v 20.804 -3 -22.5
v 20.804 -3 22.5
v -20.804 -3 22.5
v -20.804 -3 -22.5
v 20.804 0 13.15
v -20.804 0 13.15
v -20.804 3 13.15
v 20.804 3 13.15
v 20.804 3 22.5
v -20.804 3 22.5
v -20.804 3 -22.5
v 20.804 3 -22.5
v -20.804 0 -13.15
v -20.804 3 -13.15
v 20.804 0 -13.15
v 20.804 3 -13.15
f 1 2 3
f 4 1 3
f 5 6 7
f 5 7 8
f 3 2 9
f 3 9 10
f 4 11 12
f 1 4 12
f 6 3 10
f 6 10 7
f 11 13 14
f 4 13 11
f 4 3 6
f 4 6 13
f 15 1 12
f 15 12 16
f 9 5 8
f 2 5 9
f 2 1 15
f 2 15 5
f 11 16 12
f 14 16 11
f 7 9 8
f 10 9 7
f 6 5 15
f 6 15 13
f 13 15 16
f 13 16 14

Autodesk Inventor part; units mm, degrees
ref_plane "YZ Plane" through (0, 0, 0) normal (1, 0, 0) x (0, 1, 0)
ref_plane "XZ Plane" through (0, 0, 0) normal (0, 1, 0) x (-1, 0, 0)
ref_plane "XY Plane" through (0, 0, 0) normal (0, 0, 1) x (1, 0, 0)
sketch "Sketch1" plane through (0, 0, 0) normal (0, 1, 0) x (-1, 0, 0)
  line L0 (-20.8041, 22.5) -> (20.8041, 22.5)
  line L1 (20.8041, 22.5) -> (20.8041, -22.5)
  line L2 (20.8041, -22.5) -> (-20.8041, -22.5)
  line L3 (-20.8041, -22.5) -> (-20.8041, 22.5)
  line L4 (-20.8041, 22.5) -> (20.8041, -22.5) construction
  line L5 (20.8041, 22.5) -> (-20.8041, -22.5) construction
  line L6 (-20.8041, -13.15) -> (20.8041, -13.15)
  line L7 (20.8041, -13.15) -> (20.8041, 13.15)
  line L8 (20.8041, 13.15) -> (-20.8041, 13.15)
  line L9 (-20.8041, 13.15) -> (-20.8041, -13.15)
  line L10 (-20.8041, -13.15) -> (20.8041, 13.15) construction
  line L11 (20.8041, -13.15) -> (-20.8041, 13.15) construction
  point P0 (0, 0)
  dimension "d0" = 26.3
  dimension "d1" = 45
extrude "Extrusion1" add sketch "Sketch1" along normal blind 3 contours L0 L1 L8 L3 | L6 L1 L2 L3
extrude "Extrusion2" add sketch "Sketch1" against normal blind 3
properties part number "ESPACIADOR_CREMALLERA" material "Steel, Mild, Welded"
